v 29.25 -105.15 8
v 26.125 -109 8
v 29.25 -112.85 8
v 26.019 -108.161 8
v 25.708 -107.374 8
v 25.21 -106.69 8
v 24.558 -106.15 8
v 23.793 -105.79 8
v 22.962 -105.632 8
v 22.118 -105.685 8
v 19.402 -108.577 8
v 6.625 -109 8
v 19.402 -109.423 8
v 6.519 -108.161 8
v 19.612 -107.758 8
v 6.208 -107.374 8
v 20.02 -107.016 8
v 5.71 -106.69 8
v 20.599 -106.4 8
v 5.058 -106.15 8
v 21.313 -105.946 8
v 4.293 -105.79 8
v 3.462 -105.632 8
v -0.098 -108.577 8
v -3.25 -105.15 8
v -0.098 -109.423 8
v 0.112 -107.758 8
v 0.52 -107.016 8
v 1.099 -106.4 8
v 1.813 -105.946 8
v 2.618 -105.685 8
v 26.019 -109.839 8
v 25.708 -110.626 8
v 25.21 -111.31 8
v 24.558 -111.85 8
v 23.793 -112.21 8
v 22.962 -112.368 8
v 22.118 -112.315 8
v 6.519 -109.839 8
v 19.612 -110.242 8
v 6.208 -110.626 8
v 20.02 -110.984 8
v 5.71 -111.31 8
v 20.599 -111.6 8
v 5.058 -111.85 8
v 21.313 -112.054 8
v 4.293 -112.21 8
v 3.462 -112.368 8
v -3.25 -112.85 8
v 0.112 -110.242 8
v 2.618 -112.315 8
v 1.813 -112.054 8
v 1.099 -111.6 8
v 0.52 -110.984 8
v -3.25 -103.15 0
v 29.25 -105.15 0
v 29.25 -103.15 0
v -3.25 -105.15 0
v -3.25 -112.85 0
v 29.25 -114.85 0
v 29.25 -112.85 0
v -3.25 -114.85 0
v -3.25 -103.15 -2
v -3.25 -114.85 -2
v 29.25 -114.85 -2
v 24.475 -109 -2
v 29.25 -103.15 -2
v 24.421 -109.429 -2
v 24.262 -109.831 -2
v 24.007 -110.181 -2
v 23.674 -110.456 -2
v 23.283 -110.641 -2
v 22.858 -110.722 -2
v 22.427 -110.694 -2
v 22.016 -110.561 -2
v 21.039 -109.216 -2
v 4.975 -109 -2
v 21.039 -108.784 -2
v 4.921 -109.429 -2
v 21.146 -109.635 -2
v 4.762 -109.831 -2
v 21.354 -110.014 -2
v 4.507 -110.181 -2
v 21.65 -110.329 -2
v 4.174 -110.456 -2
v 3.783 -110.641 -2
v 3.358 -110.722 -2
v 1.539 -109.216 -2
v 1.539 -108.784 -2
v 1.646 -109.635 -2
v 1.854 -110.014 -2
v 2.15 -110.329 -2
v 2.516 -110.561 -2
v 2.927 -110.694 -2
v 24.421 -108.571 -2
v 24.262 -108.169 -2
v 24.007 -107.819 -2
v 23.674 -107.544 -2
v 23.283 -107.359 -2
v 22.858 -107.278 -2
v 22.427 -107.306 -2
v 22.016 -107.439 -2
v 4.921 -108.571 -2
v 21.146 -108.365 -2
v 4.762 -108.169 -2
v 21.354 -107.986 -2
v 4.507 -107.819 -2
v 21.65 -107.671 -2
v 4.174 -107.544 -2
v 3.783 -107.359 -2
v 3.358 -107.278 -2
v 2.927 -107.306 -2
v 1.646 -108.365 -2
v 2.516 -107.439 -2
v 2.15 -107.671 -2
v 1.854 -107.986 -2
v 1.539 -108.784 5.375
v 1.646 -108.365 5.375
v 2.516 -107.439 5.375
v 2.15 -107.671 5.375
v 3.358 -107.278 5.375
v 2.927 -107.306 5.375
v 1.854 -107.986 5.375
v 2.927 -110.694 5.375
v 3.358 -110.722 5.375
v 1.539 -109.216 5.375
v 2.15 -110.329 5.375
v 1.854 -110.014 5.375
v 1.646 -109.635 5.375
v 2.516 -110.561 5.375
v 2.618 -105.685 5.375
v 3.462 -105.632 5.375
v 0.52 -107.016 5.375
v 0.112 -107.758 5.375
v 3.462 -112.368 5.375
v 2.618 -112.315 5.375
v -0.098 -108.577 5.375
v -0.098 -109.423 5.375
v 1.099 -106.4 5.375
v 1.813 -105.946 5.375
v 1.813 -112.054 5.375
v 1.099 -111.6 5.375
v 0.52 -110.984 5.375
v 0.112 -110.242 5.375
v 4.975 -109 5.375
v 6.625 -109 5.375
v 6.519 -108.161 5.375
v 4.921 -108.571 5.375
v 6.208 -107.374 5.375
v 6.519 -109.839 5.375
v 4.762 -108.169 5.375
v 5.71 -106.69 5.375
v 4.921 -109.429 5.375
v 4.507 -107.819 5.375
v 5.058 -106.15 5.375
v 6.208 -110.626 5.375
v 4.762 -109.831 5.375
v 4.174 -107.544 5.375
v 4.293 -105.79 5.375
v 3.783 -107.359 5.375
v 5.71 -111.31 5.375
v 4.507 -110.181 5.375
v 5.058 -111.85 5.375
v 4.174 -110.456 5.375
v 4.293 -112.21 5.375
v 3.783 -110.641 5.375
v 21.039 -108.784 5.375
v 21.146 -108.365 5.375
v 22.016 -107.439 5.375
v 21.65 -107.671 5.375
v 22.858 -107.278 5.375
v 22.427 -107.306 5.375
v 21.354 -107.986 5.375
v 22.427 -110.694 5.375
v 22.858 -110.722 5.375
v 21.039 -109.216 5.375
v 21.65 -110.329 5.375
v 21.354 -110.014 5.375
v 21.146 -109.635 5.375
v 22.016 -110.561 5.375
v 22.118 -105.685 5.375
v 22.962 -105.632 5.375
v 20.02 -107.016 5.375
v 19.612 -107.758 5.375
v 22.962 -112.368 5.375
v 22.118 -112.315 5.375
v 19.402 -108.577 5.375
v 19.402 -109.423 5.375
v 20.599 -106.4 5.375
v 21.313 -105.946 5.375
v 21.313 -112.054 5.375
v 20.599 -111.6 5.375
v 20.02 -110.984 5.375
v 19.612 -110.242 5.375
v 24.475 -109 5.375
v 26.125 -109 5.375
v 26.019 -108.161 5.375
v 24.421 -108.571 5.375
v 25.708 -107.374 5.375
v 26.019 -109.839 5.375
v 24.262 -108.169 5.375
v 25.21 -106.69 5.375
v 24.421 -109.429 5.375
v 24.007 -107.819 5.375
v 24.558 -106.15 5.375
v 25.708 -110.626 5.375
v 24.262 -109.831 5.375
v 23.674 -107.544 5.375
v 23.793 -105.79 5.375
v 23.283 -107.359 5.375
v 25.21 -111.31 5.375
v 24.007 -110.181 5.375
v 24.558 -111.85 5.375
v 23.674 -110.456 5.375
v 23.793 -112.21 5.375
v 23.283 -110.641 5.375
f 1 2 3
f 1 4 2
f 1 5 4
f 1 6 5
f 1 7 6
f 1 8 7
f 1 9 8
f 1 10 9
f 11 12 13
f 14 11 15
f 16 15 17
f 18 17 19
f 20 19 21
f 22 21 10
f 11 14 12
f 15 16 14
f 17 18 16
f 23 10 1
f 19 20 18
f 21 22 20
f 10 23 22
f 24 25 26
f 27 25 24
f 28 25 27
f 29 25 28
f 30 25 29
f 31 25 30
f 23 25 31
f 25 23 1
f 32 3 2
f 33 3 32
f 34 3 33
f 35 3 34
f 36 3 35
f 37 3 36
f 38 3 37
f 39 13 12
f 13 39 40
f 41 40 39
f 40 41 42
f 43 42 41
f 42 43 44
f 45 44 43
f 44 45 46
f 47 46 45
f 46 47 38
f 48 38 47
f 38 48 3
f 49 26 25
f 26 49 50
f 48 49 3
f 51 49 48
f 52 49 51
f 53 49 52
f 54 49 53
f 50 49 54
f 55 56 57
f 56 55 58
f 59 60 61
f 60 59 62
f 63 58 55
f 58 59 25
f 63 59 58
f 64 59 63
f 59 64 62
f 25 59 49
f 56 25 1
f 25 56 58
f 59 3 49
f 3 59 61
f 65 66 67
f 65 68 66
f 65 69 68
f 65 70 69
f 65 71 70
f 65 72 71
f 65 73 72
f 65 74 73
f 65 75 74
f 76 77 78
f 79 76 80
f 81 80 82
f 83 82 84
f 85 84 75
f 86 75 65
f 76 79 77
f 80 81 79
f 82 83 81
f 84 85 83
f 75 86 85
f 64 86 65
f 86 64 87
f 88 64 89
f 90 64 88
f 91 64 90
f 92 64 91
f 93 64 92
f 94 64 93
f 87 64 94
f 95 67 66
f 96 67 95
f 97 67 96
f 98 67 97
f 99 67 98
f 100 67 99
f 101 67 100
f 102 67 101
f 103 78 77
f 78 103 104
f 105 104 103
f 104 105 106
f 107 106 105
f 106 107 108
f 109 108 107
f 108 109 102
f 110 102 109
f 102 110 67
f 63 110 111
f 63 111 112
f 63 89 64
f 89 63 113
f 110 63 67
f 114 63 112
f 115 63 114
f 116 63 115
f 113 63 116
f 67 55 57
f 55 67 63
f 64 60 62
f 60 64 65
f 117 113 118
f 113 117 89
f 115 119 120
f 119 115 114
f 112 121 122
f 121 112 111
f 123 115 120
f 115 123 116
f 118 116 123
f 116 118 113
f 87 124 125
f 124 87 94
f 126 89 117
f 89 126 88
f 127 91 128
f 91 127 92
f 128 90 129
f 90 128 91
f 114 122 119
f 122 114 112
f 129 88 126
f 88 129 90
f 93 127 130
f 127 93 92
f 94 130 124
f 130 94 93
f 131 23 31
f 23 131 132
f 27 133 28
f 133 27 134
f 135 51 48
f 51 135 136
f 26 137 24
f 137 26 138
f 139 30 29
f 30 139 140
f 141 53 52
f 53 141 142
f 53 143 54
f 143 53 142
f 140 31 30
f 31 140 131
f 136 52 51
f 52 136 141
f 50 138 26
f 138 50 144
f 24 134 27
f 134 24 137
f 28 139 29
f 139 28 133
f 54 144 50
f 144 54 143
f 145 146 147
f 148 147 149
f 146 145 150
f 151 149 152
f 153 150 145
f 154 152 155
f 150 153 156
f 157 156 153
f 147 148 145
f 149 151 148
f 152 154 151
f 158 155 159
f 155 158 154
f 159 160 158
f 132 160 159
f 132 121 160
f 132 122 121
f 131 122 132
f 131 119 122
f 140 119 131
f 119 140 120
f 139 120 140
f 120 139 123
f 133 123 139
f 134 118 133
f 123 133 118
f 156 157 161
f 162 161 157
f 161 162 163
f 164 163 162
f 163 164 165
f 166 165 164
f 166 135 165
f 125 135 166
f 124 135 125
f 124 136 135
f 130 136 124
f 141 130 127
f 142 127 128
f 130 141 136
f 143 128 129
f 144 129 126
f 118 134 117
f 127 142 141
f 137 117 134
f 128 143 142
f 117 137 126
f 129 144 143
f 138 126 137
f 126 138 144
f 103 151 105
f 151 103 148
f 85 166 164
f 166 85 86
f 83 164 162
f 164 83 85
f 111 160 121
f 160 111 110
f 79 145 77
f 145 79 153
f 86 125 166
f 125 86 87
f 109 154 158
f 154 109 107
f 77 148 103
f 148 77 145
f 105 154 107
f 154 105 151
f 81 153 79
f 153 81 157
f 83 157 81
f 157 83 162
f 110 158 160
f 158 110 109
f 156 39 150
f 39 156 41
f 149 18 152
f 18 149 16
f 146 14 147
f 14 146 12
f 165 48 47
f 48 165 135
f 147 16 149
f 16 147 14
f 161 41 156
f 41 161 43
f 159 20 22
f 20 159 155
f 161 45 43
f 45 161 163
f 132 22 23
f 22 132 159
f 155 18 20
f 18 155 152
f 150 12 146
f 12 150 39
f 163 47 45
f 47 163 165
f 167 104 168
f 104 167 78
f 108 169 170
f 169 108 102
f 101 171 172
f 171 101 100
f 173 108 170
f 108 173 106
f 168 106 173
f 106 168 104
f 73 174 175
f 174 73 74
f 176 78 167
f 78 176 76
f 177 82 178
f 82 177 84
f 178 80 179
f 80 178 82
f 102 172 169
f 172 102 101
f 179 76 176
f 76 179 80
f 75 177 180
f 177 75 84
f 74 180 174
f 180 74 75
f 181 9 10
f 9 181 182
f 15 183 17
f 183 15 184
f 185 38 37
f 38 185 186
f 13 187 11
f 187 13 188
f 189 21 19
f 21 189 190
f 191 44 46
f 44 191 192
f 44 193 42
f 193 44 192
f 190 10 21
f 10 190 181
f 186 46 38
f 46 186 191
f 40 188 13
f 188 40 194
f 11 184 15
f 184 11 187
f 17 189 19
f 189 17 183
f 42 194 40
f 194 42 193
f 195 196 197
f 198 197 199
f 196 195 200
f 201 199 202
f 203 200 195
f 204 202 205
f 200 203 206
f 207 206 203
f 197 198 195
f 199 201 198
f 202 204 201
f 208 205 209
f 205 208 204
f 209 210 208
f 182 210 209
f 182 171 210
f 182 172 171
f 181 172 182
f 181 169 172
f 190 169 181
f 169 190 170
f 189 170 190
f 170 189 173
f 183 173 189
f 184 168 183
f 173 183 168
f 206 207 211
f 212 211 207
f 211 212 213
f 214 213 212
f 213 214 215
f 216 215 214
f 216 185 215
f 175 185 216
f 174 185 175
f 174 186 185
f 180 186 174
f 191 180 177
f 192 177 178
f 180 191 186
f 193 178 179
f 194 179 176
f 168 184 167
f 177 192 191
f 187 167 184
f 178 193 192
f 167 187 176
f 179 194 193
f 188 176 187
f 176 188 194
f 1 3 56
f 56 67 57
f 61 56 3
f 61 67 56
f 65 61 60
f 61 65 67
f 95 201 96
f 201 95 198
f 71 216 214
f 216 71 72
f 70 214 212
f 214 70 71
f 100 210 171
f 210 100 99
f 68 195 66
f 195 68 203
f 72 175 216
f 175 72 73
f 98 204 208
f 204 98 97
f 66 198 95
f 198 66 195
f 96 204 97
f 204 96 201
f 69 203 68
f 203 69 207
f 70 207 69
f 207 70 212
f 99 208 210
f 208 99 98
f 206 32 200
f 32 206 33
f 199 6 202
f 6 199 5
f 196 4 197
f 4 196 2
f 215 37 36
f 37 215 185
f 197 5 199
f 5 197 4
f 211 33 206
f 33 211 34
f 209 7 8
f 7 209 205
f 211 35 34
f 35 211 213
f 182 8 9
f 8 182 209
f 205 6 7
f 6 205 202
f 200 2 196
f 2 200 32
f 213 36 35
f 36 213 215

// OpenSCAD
// file: needlebedScrews.scad
include<params.scad>;

module screwHoles(screw) {
    // "screw" is passed in during the loop to place holes at either end of the assembly
    if (screw > 0) { //left half
       // spongebar screw
       translate([gauge/2,-(NEEDLE_BED_DEPTH-COMB) + SPONGE_BAR/2, 0]) {
         cylinder(h = needleBedHeight*2 + 1, d = screwDiam, center = true, $fn = 25); 
         translate([0,0,railHeight]) 
             cylinder(h = screwHeadHeight*2 + tolerance, d = screwHeadDiam, center = true, $fn = 25);   
       }
       // back screw, back cover
       translate([gauge/2, -5, 0]) {
         cylinder(h = needleBedHeight*2 + 1, d = screwDiam, center = true, $fn = 25);
                cylinder(h = screwHeadHeight*2 + tolerance, d = screwHeadDiam, center = true, $fn = 25);   
       }    
         // front screw, back cover
       translate([gauge/2, -BACK_COVER + 5, 0]) {
         cylinder(h = needleBedHeight*2 + 1, d = screwDiam, center = true, $fn = 25);  
          cylinder(h = screwHeadHeight*2 + tolerance, d = screwHeadDiam, center = true, $fn = 25);   
       }
     }
     
     if (screw < 0) { //right half
       // spongebar screw
       translate([-gauge/2,-(NEEDLE_BED_DEPTH-COMB) + SPONGE_BAR/2, 0]) {
         cylinder(h = needleBedHeight*2 + 1, d = screwDiam, center = true, $fn = 25); 
         translate([0,0,railHeight]) 
             cylinder(h = screwHeadHeight*2 + tolerance, d = screwHeadDiam, center = true, $fn = 25);   
       }
       // back screw, back cover
       translate([-gauge/2, -5, 0]) {
         cylinder(h = needleBedHeight*2 + 1, d = screwDiam, center = true, $fn = 25);
                cylinder(h = screwHeadHeight*2 + tolerance, d = screwHeadDiam, center = true, $fn = 25);   
       }    
         // front screw, back cover
       translate([-gauge/2, -BACK_COVER + 5, 0]) {
         cylinder(h = needleBedHeight*2 + 1, d = screwDiam, center = true, $fn = 25);  
          cylinder(h = screwHeadHeight*2 + tolerance, d = screwHeadDiam, center = true, $fn = 25);   
       }
     }
  
}

//screwHoles(screw = 1);
// file: params.scad
/*

Values in `camelCase` are user-variable (within reason); 
values like numNeedles and screwDiam, etc.,  can be modified to
accommodate user preference or hardware subsitution. 

Values in `ALL_CAPS` should be considered CONSTANTS and should
only be modified with *extreme caution* as they will affect the 
relationship between the needles and the cams, which could
prevent stitches from forming correctly.

I recommend only modifying these constants if you are also 
making changes to the cam design in the technical sketch.
*/

gauge = 6.5;
numNeedles = 5;
tolerance = 0.15; // allows a bit of room for parts that have to fit together; adjust according to your printer's precision

// ---
// Hardware dimensions 
// (actual measurements, no tolerances)

// - pan head 6-32 machine screws
screwDiam = 3.45;
screwHeight = 18;
screwHeadDiam = 6.75; 
screwHeadHeight = 2.55;
nutWidth = 7.9;
nutHeight = 2.8;

// ---
// Needle dimensions
// - Brother needles
BUTT_HEIGHT = 15;
NEEDLE_WIDTH = 1.25;
NEEDLE_LEG_HEIGHT = 1.85;

// ---
// Needle Bed Zones
BACK_COVER = 45;
OOW_TRACK = 8;
B_TRACK = 42; // will divvy up working tracks (B & C position) later
C_TRACK = 0;
WORKING_TRACK = B_TRACK + C_TRACK;
HOLD_TRACK = 8;
SPONGE_BAR = 12;
COMB = 29;
NEEDLE_EXTENSION = 34.5;

// ---
// Needle bed dimensions
NEEDLE_BED_DEPTH = BACK_COVER + OOW_TRACK + WORKING_TRACK + HOLD_TRACK + SPONGE_BAR + COMB;
needleBedHeight = BUTT_HEIGHT;// screwHeight + 2;
needleSlotHeight = NEEDLE_LEG_HEIGHT * 2 + screwHeadHeight;
needleSlotWidth = NEEDLE_WIDTH + 0.25; // add a small amount of clearance
combWidth = gauge*2/3; // width of cutouts for stitch formation; this gives room for the thickness of the yarn looped around the needle when it pulls back into the slot, but has to balance leaving enough material for the remaining "teeth" to not be too fragile
spongeThickness = 2.5;
spongeBarThickness = needleSlotHeight - NEEDLE_LEG_HEIGHT - spongeThickness;
//echo(spongeBarThickness);

// ---
// Carriage dimensions
// refer to technical sketch
camHeight = BUTT_HEIGHT; // thickness of the tracks the needles ride along
camPlateHeight = 3; // plate behind the cams
CAM_PLATE_WIDTH = 88 * 2; 
CAM_PLATE_DEPTH = NEEDLE_BED_DEPTH - COMB;

railDepth = 8;
railHeight = 8; // ???
// main file
include<params.scad>;
include<needlebedScrews.scad>;

module spongeBar(screw = 0) {
        difference() {
        union () {
            frontRail();
            translate([0,-(NEEDLE_BED_DEPTH-COMB) + SPONGE_BAR/2, -1])
            cube([gauge,SPONGE_BAR - tolerance*2,2], center = true);
        }
        screwHoles(screw);
    }
}

module frontRail(width = gauge, rounded = false) {
    translate([0,-(NEEDLE_BED_DEPTH-COMB) + SPONGE_BAR/2, railHeight/2]) {
        cube([width, railDepth - tolerance*2, railHeight], center = true);
        if (rounded) {
            translate([-width/2,0,0])
            cylinder(railHeight, d = railDepth-tolerance*2, center = true);
        }
    }
}

for(i = [0:numNeedles-1]) {
            if (i == 0 || i==numNeedles-2) {
                     translate([gauge*i, 0, 0])
                         spongeBar(screw = 1);   
            } else if (i==1 || i==numNeedles-1) {
                translate([gauge*i, 0, 0])
                         spongeBar(screw = -1);   
            } else {
                translate([gauge*i, 0, 0])
                         spongeBar(screw = 0);   
            }
        }
